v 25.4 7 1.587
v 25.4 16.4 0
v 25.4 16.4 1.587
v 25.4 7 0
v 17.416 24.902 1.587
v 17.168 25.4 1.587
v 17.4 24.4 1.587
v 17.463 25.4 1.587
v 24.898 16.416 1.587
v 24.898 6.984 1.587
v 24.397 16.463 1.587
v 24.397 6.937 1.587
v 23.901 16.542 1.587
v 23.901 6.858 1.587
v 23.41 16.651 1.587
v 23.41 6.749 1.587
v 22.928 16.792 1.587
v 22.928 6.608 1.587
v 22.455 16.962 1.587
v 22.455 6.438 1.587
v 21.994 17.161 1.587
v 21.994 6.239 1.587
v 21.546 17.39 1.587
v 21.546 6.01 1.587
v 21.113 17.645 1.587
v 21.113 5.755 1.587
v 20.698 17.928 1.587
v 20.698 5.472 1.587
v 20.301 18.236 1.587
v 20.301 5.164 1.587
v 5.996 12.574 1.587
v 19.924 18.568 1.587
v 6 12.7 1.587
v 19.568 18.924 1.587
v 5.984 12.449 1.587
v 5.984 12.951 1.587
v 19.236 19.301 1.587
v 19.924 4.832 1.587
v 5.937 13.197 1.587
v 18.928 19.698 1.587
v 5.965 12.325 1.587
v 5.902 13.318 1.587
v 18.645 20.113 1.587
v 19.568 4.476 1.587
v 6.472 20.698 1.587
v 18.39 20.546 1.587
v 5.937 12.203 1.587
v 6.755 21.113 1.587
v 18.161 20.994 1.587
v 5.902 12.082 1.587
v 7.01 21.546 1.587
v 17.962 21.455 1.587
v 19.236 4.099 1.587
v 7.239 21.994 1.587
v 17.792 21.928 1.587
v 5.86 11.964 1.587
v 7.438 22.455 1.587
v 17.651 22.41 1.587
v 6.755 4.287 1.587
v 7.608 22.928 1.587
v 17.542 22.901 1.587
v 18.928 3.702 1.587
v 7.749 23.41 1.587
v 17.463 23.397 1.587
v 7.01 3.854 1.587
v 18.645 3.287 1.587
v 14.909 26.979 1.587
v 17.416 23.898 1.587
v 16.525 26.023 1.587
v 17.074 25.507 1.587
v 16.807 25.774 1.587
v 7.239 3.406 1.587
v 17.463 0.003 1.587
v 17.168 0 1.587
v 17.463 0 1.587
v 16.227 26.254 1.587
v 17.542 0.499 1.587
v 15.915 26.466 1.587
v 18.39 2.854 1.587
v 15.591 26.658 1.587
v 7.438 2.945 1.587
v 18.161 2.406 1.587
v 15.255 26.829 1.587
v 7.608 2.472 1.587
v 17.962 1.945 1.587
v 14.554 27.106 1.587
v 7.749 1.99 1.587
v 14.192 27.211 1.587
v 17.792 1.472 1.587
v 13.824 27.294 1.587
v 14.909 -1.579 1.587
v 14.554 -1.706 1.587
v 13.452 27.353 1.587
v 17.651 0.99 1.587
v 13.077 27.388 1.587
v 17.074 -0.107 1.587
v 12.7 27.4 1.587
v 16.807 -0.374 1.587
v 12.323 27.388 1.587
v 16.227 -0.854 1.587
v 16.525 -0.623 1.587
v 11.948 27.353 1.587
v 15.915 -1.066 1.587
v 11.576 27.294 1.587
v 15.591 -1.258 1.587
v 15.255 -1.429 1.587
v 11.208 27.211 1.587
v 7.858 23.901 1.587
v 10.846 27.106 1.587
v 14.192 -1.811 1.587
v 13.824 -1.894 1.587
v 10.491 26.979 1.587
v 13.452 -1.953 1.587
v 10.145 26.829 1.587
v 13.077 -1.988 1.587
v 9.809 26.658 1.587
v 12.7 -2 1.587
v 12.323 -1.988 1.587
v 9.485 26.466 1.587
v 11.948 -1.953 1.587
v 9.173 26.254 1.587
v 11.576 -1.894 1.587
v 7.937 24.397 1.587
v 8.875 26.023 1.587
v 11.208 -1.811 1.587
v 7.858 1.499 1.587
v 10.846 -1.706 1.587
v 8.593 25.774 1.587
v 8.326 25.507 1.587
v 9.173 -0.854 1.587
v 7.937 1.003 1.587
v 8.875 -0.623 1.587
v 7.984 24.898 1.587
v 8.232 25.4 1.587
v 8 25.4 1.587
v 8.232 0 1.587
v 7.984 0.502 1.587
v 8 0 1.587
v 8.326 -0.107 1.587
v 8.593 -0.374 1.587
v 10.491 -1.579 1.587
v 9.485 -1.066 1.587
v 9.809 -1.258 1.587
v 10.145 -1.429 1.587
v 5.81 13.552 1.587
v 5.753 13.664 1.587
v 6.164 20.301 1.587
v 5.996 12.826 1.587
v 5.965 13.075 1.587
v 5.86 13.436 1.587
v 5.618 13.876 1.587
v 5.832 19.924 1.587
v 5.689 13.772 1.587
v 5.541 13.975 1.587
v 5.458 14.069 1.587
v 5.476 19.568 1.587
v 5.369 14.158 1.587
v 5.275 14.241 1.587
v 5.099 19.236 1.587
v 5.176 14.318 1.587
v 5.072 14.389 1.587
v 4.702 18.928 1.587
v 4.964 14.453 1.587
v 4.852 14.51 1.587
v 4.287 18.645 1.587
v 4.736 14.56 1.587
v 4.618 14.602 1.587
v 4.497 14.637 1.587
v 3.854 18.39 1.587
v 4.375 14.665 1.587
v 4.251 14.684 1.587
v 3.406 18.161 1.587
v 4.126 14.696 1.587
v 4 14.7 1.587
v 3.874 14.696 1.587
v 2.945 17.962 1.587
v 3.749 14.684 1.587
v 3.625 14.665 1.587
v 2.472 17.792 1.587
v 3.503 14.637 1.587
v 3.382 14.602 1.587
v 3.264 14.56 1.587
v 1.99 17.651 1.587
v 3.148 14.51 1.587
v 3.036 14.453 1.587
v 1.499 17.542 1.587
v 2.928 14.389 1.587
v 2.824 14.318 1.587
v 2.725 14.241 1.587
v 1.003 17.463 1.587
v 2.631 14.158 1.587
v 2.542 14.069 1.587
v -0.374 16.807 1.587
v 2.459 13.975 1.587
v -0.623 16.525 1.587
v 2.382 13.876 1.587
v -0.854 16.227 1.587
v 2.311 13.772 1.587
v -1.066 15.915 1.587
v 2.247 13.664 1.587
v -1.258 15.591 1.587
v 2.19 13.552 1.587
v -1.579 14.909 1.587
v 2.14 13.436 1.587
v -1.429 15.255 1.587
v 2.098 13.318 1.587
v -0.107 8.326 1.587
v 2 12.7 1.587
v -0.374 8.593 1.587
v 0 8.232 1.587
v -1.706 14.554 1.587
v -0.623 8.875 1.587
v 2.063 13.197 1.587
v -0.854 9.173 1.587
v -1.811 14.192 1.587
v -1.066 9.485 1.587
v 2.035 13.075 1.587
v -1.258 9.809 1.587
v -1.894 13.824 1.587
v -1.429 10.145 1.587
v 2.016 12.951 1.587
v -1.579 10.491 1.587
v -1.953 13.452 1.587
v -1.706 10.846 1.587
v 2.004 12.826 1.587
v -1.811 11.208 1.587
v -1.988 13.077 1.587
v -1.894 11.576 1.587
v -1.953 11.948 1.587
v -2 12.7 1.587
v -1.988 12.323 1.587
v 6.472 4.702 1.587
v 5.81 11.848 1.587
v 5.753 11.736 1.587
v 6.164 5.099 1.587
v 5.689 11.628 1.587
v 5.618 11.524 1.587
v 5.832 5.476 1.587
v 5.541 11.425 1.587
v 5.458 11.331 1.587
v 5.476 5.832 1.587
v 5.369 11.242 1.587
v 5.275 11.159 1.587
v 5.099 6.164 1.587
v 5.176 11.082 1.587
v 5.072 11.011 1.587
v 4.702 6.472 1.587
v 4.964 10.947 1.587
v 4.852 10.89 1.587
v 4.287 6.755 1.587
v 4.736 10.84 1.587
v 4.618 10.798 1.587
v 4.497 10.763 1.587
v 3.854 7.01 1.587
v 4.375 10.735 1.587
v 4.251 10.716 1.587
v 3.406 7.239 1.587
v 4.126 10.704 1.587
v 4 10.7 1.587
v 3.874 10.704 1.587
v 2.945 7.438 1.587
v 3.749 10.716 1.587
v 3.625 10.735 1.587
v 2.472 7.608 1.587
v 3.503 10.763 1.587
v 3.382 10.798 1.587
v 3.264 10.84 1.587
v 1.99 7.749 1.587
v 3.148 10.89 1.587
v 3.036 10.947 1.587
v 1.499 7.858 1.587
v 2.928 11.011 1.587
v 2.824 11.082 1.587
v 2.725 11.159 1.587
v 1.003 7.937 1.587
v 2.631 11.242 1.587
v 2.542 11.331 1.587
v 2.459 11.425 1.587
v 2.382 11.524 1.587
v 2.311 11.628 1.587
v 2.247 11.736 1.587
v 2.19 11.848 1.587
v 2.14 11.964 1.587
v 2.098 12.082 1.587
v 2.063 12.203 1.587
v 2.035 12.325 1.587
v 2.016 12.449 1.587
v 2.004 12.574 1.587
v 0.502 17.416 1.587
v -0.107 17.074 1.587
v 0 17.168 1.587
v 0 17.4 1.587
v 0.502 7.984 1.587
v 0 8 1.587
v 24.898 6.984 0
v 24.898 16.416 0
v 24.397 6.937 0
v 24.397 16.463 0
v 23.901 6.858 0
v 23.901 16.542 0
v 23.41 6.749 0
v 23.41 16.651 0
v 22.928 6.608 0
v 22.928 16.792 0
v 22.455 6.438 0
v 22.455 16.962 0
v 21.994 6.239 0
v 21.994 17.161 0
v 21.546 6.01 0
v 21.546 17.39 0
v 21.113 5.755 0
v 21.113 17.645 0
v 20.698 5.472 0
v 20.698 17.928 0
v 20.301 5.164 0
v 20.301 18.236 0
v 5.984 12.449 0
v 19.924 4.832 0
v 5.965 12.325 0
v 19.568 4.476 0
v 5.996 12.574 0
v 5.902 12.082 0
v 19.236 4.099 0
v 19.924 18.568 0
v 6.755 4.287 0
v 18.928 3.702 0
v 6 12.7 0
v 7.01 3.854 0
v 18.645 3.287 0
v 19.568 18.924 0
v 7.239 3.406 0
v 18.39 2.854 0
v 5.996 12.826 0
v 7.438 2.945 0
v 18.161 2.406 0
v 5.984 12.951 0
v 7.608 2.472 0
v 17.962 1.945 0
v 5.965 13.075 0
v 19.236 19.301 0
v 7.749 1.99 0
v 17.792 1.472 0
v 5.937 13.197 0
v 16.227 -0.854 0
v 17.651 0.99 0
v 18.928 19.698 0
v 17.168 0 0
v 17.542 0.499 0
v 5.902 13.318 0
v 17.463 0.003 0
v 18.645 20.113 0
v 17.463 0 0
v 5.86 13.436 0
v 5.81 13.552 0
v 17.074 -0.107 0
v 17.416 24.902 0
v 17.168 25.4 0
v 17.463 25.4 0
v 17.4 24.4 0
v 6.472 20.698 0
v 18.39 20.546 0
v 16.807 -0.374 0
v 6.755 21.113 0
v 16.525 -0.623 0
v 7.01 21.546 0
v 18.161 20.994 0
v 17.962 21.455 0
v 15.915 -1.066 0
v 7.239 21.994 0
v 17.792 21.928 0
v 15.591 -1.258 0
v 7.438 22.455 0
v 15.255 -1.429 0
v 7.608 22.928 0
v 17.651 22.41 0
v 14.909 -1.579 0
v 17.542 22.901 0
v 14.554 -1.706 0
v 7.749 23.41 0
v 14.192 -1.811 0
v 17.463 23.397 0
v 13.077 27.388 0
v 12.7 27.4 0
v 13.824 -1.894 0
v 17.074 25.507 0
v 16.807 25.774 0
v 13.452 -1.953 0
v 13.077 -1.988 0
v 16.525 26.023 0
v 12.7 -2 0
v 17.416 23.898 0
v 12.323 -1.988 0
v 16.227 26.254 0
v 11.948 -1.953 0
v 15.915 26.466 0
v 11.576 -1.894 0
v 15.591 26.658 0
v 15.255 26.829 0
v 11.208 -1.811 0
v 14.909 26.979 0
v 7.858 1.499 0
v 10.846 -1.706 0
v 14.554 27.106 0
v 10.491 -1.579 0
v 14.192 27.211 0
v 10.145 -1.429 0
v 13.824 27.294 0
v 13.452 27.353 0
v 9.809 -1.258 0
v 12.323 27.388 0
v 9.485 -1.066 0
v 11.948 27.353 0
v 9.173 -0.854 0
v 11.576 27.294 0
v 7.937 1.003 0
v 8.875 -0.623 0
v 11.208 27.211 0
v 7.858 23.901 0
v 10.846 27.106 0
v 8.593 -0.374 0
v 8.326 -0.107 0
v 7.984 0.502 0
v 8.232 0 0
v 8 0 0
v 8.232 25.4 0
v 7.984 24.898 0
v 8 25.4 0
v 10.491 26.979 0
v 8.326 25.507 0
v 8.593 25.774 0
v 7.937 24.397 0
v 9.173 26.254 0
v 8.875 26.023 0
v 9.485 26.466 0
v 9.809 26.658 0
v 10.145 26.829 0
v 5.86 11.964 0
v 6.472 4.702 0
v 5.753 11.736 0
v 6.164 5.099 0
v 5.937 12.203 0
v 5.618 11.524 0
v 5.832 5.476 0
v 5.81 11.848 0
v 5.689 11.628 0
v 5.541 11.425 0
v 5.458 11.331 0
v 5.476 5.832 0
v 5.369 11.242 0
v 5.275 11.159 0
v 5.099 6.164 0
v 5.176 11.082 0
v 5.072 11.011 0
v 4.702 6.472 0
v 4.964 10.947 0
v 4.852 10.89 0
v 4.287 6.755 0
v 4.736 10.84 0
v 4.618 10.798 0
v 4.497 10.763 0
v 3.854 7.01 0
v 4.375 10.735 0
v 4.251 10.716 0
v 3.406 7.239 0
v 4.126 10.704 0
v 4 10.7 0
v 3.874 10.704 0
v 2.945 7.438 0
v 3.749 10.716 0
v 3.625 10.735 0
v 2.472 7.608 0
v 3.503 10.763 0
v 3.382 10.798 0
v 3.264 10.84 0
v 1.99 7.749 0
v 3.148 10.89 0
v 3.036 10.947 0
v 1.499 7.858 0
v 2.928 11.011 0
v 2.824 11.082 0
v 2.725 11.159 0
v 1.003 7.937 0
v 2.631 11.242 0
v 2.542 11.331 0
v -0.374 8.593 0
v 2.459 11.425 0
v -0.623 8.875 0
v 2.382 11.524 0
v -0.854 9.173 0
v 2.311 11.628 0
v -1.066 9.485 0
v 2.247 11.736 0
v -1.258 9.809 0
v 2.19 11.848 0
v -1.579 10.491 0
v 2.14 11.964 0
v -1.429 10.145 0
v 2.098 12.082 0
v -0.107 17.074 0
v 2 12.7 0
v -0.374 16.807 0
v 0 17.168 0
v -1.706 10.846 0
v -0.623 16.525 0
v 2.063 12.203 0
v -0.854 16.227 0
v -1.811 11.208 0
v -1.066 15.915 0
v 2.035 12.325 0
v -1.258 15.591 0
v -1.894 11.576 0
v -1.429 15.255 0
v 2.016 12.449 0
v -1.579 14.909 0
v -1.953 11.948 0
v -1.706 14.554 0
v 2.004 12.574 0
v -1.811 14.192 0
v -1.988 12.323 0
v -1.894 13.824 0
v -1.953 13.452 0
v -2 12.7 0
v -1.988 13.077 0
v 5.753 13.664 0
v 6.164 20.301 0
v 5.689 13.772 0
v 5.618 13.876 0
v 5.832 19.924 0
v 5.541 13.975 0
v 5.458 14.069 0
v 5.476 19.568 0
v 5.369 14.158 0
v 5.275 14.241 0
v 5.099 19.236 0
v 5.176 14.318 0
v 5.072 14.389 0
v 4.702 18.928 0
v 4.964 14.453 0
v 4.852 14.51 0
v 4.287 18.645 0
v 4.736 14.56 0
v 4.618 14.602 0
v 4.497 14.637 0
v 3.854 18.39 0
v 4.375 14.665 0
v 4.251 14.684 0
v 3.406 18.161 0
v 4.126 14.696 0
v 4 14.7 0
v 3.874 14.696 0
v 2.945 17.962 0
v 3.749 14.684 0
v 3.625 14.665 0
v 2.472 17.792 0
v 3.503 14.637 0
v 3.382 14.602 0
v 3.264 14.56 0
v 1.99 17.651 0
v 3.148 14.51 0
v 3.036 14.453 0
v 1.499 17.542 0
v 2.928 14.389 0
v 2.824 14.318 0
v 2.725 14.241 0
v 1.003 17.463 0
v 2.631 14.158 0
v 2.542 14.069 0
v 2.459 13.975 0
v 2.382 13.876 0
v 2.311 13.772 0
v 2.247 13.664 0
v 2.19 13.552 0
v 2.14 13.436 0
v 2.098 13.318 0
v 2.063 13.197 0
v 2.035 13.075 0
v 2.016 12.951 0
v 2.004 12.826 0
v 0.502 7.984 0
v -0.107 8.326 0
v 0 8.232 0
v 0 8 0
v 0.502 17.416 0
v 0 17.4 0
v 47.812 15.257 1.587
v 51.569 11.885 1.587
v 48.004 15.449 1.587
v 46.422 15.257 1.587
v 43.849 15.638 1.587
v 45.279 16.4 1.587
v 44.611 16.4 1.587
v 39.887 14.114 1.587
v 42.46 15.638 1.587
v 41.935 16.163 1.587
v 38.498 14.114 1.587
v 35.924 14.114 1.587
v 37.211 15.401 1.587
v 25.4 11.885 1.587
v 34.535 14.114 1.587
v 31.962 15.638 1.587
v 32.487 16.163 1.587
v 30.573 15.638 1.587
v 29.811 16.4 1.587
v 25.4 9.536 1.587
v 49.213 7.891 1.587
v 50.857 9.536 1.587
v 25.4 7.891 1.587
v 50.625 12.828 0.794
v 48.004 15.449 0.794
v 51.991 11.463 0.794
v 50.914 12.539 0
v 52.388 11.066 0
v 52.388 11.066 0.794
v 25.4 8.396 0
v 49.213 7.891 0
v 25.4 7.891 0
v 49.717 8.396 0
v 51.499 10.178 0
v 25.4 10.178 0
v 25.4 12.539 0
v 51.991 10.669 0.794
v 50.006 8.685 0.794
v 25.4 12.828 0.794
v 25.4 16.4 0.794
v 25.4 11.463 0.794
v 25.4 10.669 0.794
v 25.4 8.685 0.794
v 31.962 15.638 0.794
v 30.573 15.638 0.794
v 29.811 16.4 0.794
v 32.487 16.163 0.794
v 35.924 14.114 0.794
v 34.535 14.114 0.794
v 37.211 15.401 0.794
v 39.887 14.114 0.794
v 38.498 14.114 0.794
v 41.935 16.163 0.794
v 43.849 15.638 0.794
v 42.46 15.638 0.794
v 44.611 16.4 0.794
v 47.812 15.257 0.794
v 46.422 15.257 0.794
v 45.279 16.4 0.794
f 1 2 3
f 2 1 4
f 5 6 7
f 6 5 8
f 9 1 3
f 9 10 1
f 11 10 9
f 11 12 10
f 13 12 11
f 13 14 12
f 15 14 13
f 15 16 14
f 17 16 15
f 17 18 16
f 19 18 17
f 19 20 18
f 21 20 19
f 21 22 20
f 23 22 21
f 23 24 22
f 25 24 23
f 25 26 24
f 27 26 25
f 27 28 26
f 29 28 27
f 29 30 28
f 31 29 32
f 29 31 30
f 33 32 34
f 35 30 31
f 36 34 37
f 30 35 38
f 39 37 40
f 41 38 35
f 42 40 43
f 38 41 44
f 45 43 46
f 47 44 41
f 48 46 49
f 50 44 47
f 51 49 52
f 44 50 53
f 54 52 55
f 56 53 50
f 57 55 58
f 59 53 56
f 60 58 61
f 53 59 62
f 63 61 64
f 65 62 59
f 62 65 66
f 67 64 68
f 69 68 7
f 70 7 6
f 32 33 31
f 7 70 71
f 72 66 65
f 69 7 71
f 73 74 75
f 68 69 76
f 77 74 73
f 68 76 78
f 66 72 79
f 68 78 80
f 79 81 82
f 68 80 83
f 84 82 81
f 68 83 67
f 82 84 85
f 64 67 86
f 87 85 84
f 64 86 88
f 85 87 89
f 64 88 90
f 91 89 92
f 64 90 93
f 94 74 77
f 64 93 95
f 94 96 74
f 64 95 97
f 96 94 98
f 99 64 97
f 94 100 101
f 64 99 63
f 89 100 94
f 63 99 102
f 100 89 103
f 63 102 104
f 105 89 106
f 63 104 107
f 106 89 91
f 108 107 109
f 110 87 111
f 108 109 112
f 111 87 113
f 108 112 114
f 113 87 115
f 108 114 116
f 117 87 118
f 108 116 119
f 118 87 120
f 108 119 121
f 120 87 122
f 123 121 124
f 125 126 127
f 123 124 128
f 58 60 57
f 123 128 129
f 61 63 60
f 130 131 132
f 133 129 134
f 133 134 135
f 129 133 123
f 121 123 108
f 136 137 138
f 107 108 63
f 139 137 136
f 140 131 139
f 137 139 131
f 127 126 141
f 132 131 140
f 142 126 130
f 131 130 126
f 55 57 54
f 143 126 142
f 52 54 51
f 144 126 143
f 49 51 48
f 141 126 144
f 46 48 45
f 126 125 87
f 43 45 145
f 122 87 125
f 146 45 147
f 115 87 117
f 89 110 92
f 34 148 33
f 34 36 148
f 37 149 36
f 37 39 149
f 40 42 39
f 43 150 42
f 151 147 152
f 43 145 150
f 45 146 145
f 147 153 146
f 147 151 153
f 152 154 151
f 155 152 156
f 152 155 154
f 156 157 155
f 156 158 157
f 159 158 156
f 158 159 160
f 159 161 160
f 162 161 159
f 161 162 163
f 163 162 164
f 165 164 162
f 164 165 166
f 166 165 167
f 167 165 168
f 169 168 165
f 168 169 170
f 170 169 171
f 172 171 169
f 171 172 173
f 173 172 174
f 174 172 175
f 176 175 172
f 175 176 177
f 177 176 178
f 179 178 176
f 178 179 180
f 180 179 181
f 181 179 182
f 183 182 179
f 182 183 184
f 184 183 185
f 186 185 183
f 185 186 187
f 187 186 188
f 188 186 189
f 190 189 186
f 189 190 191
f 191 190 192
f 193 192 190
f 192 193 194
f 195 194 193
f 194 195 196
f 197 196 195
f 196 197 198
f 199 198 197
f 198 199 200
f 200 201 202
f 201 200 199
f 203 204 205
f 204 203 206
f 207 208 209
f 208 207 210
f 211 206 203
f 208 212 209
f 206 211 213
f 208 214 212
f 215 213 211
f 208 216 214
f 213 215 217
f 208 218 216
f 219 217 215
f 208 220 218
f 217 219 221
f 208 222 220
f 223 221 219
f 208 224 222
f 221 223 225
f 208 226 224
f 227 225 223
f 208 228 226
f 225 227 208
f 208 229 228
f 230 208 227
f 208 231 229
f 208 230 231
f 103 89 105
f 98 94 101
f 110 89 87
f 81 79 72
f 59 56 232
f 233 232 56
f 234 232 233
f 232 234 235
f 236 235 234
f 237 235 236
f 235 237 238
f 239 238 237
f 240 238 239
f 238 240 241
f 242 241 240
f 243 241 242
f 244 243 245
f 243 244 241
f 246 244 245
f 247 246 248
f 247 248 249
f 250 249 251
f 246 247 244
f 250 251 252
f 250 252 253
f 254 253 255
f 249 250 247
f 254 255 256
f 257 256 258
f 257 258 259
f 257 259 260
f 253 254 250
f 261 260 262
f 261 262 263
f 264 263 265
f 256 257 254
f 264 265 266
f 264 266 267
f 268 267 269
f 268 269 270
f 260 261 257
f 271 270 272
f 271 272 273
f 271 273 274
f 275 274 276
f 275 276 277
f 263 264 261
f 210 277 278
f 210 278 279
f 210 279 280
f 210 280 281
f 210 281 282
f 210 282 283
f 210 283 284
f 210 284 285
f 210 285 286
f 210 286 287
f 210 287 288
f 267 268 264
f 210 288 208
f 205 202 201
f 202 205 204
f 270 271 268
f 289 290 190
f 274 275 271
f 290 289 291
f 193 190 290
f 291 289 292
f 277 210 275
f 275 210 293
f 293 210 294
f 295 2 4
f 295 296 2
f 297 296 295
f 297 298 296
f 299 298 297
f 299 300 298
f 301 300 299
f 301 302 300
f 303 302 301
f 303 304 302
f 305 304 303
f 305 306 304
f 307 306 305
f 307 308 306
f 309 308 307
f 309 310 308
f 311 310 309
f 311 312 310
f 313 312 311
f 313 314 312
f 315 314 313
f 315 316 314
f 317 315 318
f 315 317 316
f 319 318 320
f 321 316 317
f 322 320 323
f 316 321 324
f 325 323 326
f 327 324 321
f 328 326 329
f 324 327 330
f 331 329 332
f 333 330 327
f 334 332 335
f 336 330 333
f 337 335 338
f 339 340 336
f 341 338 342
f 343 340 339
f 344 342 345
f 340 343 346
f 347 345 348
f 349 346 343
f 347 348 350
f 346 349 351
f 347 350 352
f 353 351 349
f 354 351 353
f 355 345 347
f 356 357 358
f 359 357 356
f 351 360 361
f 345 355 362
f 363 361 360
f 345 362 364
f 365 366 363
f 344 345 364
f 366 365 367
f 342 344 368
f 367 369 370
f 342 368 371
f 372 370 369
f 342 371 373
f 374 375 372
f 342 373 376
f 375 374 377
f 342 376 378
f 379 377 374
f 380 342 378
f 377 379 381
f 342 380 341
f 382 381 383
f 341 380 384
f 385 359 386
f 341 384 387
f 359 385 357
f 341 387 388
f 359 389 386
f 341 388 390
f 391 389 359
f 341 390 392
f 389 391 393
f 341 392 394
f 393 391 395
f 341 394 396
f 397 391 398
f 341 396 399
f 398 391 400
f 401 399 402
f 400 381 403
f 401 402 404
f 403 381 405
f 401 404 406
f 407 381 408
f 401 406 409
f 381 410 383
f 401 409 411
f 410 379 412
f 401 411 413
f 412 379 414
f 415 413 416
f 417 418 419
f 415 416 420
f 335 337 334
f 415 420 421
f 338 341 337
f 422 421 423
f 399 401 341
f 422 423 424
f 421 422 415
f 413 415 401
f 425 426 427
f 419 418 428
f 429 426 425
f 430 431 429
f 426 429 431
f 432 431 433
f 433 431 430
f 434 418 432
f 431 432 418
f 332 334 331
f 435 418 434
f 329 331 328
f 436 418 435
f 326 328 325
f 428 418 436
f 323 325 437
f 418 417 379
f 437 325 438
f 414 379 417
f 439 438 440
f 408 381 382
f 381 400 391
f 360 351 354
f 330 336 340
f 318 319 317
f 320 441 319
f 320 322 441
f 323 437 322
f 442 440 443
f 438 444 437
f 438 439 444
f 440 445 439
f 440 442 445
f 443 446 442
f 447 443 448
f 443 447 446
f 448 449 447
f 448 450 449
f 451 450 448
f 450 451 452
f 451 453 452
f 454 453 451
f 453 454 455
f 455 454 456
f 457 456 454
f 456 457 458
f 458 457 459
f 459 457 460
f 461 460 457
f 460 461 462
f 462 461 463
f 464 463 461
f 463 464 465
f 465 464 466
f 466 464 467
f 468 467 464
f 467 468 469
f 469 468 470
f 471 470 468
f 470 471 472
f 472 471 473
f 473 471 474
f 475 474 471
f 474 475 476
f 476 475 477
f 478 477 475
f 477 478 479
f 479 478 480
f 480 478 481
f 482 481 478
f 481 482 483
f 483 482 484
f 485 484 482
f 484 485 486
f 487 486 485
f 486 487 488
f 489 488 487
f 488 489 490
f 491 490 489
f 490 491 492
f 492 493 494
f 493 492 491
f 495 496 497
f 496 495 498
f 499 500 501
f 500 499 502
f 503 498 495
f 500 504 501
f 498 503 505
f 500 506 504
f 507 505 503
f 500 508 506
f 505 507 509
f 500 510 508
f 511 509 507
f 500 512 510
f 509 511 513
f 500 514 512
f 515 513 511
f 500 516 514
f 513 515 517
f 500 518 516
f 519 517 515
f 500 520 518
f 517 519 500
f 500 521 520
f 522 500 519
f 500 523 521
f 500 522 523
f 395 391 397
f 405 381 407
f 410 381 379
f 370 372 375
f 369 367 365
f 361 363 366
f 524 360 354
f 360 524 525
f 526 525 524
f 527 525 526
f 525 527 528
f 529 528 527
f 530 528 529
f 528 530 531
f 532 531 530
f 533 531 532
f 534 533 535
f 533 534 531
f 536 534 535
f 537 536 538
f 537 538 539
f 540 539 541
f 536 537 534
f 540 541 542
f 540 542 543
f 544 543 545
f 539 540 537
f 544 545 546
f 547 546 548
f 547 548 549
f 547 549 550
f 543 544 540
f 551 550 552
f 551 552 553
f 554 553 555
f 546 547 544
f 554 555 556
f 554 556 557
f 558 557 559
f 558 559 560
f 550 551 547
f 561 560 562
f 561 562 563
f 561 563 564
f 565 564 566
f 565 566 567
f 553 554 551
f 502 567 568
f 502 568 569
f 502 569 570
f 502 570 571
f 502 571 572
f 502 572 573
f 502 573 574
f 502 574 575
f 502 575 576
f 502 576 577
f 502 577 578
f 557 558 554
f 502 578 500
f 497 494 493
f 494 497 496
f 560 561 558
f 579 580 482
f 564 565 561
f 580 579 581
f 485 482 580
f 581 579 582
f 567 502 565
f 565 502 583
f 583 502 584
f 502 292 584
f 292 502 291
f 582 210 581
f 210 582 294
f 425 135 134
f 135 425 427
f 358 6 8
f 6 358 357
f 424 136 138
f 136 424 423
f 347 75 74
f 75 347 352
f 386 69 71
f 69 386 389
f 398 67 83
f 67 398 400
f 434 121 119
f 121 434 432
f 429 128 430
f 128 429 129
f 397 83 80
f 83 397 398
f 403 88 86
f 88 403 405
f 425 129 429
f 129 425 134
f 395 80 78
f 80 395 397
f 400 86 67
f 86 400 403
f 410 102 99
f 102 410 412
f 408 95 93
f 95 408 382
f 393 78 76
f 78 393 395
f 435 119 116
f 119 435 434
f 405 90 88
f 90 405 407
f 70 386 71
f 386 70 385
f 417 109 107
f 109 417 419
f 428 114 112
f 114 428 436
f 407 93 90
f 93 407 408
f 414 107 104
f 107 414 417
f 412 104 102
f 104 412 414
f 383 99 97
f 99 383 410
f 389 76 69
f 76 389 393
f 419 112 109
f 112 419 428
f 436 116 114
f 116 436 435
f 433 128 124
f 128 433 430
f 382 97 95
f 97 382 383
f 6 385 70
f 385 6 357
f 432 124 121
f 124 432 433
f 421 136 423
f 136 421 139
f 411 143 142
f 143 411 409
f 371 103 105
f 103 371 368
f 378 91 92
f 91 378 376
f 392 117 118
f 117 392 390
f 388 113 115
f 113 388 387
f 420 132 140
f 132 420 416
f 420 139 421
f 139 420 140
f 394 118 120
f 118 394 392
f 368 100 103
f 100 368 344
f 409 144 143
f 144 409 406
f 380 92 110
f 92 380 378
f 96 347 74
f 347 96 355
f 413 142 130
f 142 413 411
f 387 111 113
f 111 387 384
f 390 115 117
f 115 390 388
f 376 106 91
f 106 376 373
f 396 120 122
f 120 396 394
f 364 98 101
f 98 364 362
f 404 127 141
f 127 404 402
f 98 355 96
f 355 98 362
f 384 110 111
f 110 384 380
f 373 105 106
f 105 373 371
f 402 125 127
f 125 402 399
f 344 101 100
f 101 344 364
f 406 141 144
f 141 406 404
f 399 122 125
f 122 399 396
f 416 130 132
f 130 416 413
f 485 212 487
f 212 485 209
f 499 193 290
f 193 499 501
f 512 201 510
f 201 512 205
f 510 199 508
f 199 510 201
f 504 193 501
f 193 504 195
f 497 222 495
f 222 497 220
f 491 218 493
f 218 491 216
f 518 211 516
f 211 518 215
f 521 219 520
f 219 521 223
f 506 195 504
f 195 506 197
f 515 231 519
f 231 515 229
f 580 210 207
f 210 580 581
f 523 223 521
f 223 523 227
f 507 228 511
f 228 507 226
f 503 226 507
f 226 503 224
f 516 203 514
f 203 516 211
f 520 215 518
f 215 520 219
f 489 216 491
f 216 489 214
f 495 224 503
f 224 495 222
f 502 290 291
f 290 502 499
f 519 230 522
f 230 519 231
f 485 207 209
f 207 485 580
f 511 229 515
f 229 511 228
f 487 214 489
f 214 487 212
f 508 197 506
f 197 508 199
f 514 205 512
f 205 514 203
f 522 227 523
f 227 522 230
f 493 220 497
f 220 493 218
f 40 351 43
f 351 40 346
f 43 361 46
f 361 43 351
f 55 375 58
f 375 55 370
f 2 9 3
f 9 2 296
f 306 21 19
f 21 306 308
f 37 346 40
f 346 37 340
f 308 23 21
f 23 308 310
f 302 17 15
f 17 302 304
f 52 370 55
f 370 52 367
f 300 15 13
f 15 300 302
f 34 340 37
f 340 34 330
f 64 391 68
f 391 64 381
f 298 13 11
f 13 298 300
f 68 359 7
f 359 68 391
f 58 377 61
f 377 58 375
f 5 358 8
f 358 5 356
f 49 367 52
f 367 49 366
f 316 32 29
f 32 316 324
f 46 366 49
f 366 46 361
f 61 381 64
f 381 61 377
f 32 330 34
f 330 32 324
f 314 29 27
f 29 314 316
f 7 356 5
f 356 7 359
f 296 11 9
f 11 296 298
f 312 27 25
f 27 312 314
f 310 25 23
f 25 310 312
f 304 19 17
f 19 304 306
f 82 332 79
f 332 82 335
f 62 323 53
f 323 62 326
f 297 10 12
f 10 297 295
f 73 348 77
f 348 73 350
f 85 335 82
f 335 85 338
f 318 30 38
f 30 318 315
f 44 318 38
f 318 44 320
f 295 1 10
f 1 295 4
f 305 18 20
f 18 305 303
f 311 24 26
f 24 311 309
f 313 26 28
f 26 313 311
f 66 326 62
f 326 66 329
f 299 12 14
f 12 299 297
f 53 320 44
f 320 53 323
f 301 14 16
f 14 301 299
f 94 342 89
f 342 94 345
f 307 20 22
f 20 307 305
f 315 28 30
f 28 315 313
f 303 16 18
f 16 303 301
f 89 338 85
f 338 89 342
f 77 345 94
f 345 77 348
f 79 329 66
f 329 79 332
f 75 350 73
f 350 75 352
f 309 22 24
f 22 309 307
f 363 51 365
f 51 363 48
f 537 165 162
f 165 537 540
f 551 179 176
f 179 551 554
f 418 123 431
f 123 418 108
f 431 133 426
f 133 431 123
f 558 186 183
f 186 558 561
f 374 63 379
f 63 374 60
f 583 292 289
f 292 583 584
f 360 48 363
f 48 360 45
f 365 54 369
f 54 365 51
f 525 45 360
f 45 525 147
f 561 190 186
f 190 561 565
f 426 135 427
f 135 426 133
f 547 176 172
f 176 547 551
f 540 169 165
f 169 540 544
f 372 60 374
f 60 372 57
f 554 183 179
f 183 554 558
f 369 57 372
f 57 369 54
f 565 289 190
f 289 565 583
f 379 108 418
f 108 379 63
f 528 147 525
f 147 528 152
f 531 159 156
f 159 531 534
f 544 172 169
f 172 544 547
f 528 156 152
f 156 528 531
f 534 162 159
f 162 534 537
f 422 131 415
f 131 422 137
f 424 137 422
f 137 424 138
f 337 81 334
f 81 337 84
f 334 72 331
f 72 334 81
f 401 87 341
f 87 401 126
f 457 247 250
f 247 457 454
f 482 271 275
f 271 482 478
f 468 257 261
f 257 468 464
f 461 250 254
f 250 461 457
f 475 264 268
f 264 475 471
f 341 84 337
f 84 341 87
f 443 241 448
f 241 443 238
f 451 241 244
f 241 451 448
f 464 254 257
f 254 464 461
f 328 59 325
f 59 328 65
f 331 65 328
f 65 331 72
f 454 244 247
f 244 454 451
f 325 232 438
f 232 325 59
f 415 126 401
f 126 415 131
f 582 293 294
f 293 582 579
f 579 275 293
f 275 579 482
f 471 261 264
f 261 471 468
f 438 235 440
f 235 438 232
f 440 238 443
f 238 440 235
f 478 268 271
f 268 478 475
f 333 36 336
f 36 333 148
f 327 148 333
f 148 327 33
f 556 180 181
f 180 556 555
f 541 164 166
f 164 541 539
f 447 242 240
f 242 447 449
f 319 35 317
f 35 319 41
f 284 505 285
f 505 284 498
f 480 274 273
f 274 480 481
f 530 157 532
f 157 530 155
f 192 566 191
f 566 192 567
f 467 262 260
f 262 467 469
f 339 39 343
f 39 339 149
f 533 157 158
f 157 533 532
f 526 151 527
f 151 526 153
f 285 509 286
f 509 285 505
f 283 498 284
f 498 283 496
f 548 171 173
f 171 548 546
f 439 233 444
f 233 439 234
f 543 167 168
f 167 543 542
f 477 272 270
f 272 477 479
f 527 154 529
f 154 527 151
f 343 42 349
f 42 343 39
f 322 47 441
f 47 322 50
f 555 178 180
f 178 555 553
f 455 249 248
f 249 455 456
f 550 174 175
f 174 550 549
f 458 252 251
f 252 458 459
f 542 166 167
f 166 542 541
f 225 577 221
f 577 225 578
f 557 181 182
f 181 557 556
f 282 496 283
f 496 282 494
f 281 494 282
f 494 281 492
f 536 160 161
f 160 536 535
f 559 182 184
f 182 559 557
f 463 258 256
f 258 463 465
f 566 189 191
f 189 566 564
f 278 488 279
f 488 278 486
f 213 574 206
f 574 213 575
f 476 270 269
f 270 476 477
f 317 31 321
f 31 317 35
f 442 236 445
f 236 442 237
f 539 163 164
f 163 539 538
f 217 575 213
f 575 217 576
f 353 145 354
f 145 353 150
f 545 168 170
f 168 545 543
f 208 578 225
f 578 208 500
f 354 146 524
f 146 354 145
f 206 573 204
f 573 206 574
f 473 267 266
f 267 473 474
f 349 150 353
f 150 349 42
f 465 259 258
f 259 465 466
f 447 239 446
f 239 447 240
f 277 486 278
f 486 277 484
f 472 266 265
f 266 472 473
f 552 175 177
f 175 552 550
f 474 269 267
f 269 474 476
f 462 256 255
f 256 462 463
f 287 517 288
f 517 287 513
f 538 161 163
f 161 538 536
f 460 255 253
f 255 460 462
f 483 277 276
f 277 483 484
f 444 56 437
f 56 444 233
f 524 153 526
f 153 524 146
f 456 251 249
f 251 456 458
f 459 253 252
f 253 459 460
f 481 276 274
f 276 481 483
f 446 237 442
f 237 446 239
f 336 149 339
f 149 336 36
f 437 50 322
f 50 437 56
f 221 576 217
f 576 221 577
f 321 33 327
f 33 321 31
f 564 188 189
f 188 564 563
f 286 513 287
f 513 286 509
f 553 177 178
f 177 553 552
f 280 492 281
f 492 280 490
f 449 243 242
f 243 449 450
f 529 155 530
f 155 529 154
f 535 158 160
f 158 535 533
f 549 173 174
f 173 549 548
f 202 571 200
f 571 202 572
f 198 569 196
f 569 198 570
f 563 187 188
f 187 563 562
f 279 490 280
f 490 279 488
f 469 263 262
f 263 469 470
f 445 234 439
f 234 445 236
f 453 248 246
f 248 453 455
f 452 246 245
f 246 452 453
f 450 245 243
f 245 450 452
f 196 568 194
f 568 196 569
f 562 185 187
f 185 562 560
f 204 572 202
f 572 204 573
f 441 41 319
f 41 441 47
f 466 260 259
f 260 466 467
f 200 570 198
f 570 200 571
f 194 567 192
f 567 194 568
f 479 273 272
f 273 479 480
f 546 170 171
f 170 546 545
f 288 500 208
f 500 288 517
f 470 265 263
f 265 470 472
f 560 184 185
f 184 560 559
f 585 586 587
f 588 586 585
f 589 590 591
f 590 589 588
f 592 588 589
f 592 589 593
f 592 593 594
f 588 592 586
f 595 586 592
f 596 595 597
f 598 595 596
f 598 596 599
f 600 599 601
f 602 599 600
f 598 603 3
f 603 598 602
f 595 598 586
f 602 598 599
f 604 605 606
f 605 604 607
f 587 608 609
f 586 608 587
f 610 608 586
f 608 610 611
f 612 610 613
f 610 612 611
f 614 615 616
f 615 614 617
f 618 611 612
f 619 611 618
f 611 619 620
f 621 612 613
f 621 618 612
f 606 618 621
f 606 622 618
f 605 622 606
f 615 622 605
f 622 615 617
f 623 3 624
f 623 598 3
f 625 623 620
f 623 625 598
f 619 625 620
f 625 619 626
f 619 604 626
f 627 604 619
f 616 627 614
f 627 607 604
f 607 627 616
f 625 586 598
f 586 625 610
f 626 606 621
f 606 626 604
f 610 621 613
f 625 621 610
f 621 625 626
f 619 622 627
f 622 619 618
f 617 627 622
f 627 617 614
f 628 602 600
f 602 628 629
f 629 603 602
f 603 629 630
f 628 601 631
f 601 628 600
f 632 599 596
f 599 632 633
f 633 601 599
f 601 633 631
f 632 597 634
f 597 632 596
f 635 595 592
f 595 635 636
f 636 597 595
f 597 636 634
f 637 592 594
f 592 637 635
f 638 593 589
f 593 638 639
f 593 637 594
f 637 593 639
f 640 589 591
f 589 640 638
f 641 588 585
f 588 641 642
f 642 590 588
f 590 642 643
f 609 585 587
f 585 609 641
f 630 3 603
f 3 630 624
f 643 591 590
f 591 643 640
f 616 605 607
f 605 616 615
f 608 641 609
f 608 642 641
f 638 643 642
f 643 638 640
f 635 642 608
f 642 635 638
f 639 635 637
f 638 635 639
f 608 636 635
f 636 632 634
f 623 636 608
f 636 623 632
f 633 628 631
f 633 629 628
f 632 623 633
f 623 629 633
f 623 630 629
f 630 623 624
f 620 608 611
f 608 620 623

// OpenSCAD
// github.com/ewust/keys
// but done by baburgess looks like
// has a smaller bow

$fn=100;

function mm(i) = i*25.4;

module bow(bow_length, bow_width, bow_thickness)
{
	difference()
		{
				union()
						{
									cube([bow_length, bow_width, bow_thickness]);

											  	     //Place cylinders on the top and bottom of the bow for style

												     	     	       //Top middle
																	translate([bow_length / 2, bow_width - 4, 0]) cylinder(h = bow_thickness, r = 6);

																			      	//Bottom middle
																							translate([bow_length / 2, 4, 0]) cylinder(h = bow_thickness, r = 6);

																									      	//Left
																													translate([4, bow_width / 2, 0]) cylinder(h = bow_thickness, r = 6);
																														      		}

																																	//Place cylinders around the edges to create a more contoured design

																																		//Right top
																																				translate([bow_length, bow_width - 1, 0]) cylinder(h = bow_thickness, r = 8);

																																						       //Right bottom
																																								//Positioned -1 from the axis to create a bow stop
																																									     	translate([bow_length, -1 , 0]) cylinder(h = bow_thickness, r = 8);

																																												       //Left top
																																														translate([0, bow_width, 0]) cylinder(h = bow_thickness, r = 8);

																																															      //Left bottom
																																																	translate([0, 0, 0]) cylinder(h = bow_thickness, r = 8);

																																																		      //Place hole for keychain use
																																																		      	      	   translate([4, bow_width / 2, 0]) cylinder(h = bow_thickness, r = 2);
																																																				   		 }
																																																						 }

module bit()
{
	w = mm(1/4);
	  difference()
		{
				translate([-w/2, 0, 0]) cube([w, mm(1), w]);
						    translate([-mm(7/256), 0, 0]) rotate([0, 0, 135]) cube([w, w, w]);
						    			      translate([mm(7/256), 0, 0]) rotate([0, 0, -45]) cube([w, w, w]);
									      			    }
												    }

module blade(blade_length, blade_width, blade_thickness, key_cuts, shoulder, cut_spacing, cut_depth)
{
	difference()
		{
				cube([blade_length, blade_width, blade_thickness]);

						    //Contour tip
								translate([blade_length, mm(1/8), 0])
											 	  {
															rotate([0, 0, 45]) cube([10, 10, blade_thickness]);
																      	   rotate([0, 0, 225]) cube([10, 10, blade_thickness]);
																	   	      	 }

																				//Cut the key channels
																				      	  union()
																							{
																										translate([0, mm(9/64), blade_thickness / 2]) rotate([62, 0, 0]) cube([blade_length, blade_width, blade_width]);
																											      				translate([0, mm(7/64), blade_thickness / 2]) rotate([55, 0, 0]) cube([blade_length, blade_width, blade_width]);
																																      				translate([0, mm(7/64), blade_thickness / 2]) cube([blade_length, mm(1/32), blade_width]);
																																					      		}

																																								translate([0, blade_width - mm(9/64), 0]) cube([blade_length, mm(10/64), blade_thickness / 2]);
																																									      		  translate([0, blade_width - mm(9/64), blade_thickness / 2]) rotate([-110, 0, 0]) cube([blade_length, blade_width, blade_thickness / 2]);

																																											  		intersection()
																																															{
																																																		translate([0, mm(1/32), blade_thickness / 2]) rotate([-118, 0, 0]) cube([blade_length, blade_width, blade_width]);
																																																			      				translate([0, mm(1/32), blade_thickness / 2]) rotate([-110, 0, 0]) cube([blade_length, blade_width, blade_width]);
																																																								      		}

																																																											//Cut the blade
																																																											      	  for (counter = [0:4])
																																																												      	       {
																																																																translate([shoulder + (counter * cut_spacing), blade_width - (key_cuts[counter]) * cut_depth, 0]) bit();
																																																																		      }
																																																																			}
																																																																			}

module sc1(key_cuts)
{
	blade_length = mm(17/16);
		     blade_width = mm(.335);
		     		 blade_thickness = mm(0.080);

				 shoulder = mm(0.231);
				 	  cut_spacing = mm(.156);
					  	      cut_depth = mm(.015);

						      bow_length = mm(1);
						      		 bow_width = mm(1);
								 	   bow_thickness = mm(1/16);

									   union()
										{
												bow(bow_length, bow_width, bow_thickness);
															   translate([bow_length, bow_width - blade_width - 9, 0]) blade(blade_length, blade_width, bow_thickness, key_cuts, shoulder, cut_spacing, cut_depth);
															   			  }
																		  }

sc1([2, 6, 6, 2, 3]);
